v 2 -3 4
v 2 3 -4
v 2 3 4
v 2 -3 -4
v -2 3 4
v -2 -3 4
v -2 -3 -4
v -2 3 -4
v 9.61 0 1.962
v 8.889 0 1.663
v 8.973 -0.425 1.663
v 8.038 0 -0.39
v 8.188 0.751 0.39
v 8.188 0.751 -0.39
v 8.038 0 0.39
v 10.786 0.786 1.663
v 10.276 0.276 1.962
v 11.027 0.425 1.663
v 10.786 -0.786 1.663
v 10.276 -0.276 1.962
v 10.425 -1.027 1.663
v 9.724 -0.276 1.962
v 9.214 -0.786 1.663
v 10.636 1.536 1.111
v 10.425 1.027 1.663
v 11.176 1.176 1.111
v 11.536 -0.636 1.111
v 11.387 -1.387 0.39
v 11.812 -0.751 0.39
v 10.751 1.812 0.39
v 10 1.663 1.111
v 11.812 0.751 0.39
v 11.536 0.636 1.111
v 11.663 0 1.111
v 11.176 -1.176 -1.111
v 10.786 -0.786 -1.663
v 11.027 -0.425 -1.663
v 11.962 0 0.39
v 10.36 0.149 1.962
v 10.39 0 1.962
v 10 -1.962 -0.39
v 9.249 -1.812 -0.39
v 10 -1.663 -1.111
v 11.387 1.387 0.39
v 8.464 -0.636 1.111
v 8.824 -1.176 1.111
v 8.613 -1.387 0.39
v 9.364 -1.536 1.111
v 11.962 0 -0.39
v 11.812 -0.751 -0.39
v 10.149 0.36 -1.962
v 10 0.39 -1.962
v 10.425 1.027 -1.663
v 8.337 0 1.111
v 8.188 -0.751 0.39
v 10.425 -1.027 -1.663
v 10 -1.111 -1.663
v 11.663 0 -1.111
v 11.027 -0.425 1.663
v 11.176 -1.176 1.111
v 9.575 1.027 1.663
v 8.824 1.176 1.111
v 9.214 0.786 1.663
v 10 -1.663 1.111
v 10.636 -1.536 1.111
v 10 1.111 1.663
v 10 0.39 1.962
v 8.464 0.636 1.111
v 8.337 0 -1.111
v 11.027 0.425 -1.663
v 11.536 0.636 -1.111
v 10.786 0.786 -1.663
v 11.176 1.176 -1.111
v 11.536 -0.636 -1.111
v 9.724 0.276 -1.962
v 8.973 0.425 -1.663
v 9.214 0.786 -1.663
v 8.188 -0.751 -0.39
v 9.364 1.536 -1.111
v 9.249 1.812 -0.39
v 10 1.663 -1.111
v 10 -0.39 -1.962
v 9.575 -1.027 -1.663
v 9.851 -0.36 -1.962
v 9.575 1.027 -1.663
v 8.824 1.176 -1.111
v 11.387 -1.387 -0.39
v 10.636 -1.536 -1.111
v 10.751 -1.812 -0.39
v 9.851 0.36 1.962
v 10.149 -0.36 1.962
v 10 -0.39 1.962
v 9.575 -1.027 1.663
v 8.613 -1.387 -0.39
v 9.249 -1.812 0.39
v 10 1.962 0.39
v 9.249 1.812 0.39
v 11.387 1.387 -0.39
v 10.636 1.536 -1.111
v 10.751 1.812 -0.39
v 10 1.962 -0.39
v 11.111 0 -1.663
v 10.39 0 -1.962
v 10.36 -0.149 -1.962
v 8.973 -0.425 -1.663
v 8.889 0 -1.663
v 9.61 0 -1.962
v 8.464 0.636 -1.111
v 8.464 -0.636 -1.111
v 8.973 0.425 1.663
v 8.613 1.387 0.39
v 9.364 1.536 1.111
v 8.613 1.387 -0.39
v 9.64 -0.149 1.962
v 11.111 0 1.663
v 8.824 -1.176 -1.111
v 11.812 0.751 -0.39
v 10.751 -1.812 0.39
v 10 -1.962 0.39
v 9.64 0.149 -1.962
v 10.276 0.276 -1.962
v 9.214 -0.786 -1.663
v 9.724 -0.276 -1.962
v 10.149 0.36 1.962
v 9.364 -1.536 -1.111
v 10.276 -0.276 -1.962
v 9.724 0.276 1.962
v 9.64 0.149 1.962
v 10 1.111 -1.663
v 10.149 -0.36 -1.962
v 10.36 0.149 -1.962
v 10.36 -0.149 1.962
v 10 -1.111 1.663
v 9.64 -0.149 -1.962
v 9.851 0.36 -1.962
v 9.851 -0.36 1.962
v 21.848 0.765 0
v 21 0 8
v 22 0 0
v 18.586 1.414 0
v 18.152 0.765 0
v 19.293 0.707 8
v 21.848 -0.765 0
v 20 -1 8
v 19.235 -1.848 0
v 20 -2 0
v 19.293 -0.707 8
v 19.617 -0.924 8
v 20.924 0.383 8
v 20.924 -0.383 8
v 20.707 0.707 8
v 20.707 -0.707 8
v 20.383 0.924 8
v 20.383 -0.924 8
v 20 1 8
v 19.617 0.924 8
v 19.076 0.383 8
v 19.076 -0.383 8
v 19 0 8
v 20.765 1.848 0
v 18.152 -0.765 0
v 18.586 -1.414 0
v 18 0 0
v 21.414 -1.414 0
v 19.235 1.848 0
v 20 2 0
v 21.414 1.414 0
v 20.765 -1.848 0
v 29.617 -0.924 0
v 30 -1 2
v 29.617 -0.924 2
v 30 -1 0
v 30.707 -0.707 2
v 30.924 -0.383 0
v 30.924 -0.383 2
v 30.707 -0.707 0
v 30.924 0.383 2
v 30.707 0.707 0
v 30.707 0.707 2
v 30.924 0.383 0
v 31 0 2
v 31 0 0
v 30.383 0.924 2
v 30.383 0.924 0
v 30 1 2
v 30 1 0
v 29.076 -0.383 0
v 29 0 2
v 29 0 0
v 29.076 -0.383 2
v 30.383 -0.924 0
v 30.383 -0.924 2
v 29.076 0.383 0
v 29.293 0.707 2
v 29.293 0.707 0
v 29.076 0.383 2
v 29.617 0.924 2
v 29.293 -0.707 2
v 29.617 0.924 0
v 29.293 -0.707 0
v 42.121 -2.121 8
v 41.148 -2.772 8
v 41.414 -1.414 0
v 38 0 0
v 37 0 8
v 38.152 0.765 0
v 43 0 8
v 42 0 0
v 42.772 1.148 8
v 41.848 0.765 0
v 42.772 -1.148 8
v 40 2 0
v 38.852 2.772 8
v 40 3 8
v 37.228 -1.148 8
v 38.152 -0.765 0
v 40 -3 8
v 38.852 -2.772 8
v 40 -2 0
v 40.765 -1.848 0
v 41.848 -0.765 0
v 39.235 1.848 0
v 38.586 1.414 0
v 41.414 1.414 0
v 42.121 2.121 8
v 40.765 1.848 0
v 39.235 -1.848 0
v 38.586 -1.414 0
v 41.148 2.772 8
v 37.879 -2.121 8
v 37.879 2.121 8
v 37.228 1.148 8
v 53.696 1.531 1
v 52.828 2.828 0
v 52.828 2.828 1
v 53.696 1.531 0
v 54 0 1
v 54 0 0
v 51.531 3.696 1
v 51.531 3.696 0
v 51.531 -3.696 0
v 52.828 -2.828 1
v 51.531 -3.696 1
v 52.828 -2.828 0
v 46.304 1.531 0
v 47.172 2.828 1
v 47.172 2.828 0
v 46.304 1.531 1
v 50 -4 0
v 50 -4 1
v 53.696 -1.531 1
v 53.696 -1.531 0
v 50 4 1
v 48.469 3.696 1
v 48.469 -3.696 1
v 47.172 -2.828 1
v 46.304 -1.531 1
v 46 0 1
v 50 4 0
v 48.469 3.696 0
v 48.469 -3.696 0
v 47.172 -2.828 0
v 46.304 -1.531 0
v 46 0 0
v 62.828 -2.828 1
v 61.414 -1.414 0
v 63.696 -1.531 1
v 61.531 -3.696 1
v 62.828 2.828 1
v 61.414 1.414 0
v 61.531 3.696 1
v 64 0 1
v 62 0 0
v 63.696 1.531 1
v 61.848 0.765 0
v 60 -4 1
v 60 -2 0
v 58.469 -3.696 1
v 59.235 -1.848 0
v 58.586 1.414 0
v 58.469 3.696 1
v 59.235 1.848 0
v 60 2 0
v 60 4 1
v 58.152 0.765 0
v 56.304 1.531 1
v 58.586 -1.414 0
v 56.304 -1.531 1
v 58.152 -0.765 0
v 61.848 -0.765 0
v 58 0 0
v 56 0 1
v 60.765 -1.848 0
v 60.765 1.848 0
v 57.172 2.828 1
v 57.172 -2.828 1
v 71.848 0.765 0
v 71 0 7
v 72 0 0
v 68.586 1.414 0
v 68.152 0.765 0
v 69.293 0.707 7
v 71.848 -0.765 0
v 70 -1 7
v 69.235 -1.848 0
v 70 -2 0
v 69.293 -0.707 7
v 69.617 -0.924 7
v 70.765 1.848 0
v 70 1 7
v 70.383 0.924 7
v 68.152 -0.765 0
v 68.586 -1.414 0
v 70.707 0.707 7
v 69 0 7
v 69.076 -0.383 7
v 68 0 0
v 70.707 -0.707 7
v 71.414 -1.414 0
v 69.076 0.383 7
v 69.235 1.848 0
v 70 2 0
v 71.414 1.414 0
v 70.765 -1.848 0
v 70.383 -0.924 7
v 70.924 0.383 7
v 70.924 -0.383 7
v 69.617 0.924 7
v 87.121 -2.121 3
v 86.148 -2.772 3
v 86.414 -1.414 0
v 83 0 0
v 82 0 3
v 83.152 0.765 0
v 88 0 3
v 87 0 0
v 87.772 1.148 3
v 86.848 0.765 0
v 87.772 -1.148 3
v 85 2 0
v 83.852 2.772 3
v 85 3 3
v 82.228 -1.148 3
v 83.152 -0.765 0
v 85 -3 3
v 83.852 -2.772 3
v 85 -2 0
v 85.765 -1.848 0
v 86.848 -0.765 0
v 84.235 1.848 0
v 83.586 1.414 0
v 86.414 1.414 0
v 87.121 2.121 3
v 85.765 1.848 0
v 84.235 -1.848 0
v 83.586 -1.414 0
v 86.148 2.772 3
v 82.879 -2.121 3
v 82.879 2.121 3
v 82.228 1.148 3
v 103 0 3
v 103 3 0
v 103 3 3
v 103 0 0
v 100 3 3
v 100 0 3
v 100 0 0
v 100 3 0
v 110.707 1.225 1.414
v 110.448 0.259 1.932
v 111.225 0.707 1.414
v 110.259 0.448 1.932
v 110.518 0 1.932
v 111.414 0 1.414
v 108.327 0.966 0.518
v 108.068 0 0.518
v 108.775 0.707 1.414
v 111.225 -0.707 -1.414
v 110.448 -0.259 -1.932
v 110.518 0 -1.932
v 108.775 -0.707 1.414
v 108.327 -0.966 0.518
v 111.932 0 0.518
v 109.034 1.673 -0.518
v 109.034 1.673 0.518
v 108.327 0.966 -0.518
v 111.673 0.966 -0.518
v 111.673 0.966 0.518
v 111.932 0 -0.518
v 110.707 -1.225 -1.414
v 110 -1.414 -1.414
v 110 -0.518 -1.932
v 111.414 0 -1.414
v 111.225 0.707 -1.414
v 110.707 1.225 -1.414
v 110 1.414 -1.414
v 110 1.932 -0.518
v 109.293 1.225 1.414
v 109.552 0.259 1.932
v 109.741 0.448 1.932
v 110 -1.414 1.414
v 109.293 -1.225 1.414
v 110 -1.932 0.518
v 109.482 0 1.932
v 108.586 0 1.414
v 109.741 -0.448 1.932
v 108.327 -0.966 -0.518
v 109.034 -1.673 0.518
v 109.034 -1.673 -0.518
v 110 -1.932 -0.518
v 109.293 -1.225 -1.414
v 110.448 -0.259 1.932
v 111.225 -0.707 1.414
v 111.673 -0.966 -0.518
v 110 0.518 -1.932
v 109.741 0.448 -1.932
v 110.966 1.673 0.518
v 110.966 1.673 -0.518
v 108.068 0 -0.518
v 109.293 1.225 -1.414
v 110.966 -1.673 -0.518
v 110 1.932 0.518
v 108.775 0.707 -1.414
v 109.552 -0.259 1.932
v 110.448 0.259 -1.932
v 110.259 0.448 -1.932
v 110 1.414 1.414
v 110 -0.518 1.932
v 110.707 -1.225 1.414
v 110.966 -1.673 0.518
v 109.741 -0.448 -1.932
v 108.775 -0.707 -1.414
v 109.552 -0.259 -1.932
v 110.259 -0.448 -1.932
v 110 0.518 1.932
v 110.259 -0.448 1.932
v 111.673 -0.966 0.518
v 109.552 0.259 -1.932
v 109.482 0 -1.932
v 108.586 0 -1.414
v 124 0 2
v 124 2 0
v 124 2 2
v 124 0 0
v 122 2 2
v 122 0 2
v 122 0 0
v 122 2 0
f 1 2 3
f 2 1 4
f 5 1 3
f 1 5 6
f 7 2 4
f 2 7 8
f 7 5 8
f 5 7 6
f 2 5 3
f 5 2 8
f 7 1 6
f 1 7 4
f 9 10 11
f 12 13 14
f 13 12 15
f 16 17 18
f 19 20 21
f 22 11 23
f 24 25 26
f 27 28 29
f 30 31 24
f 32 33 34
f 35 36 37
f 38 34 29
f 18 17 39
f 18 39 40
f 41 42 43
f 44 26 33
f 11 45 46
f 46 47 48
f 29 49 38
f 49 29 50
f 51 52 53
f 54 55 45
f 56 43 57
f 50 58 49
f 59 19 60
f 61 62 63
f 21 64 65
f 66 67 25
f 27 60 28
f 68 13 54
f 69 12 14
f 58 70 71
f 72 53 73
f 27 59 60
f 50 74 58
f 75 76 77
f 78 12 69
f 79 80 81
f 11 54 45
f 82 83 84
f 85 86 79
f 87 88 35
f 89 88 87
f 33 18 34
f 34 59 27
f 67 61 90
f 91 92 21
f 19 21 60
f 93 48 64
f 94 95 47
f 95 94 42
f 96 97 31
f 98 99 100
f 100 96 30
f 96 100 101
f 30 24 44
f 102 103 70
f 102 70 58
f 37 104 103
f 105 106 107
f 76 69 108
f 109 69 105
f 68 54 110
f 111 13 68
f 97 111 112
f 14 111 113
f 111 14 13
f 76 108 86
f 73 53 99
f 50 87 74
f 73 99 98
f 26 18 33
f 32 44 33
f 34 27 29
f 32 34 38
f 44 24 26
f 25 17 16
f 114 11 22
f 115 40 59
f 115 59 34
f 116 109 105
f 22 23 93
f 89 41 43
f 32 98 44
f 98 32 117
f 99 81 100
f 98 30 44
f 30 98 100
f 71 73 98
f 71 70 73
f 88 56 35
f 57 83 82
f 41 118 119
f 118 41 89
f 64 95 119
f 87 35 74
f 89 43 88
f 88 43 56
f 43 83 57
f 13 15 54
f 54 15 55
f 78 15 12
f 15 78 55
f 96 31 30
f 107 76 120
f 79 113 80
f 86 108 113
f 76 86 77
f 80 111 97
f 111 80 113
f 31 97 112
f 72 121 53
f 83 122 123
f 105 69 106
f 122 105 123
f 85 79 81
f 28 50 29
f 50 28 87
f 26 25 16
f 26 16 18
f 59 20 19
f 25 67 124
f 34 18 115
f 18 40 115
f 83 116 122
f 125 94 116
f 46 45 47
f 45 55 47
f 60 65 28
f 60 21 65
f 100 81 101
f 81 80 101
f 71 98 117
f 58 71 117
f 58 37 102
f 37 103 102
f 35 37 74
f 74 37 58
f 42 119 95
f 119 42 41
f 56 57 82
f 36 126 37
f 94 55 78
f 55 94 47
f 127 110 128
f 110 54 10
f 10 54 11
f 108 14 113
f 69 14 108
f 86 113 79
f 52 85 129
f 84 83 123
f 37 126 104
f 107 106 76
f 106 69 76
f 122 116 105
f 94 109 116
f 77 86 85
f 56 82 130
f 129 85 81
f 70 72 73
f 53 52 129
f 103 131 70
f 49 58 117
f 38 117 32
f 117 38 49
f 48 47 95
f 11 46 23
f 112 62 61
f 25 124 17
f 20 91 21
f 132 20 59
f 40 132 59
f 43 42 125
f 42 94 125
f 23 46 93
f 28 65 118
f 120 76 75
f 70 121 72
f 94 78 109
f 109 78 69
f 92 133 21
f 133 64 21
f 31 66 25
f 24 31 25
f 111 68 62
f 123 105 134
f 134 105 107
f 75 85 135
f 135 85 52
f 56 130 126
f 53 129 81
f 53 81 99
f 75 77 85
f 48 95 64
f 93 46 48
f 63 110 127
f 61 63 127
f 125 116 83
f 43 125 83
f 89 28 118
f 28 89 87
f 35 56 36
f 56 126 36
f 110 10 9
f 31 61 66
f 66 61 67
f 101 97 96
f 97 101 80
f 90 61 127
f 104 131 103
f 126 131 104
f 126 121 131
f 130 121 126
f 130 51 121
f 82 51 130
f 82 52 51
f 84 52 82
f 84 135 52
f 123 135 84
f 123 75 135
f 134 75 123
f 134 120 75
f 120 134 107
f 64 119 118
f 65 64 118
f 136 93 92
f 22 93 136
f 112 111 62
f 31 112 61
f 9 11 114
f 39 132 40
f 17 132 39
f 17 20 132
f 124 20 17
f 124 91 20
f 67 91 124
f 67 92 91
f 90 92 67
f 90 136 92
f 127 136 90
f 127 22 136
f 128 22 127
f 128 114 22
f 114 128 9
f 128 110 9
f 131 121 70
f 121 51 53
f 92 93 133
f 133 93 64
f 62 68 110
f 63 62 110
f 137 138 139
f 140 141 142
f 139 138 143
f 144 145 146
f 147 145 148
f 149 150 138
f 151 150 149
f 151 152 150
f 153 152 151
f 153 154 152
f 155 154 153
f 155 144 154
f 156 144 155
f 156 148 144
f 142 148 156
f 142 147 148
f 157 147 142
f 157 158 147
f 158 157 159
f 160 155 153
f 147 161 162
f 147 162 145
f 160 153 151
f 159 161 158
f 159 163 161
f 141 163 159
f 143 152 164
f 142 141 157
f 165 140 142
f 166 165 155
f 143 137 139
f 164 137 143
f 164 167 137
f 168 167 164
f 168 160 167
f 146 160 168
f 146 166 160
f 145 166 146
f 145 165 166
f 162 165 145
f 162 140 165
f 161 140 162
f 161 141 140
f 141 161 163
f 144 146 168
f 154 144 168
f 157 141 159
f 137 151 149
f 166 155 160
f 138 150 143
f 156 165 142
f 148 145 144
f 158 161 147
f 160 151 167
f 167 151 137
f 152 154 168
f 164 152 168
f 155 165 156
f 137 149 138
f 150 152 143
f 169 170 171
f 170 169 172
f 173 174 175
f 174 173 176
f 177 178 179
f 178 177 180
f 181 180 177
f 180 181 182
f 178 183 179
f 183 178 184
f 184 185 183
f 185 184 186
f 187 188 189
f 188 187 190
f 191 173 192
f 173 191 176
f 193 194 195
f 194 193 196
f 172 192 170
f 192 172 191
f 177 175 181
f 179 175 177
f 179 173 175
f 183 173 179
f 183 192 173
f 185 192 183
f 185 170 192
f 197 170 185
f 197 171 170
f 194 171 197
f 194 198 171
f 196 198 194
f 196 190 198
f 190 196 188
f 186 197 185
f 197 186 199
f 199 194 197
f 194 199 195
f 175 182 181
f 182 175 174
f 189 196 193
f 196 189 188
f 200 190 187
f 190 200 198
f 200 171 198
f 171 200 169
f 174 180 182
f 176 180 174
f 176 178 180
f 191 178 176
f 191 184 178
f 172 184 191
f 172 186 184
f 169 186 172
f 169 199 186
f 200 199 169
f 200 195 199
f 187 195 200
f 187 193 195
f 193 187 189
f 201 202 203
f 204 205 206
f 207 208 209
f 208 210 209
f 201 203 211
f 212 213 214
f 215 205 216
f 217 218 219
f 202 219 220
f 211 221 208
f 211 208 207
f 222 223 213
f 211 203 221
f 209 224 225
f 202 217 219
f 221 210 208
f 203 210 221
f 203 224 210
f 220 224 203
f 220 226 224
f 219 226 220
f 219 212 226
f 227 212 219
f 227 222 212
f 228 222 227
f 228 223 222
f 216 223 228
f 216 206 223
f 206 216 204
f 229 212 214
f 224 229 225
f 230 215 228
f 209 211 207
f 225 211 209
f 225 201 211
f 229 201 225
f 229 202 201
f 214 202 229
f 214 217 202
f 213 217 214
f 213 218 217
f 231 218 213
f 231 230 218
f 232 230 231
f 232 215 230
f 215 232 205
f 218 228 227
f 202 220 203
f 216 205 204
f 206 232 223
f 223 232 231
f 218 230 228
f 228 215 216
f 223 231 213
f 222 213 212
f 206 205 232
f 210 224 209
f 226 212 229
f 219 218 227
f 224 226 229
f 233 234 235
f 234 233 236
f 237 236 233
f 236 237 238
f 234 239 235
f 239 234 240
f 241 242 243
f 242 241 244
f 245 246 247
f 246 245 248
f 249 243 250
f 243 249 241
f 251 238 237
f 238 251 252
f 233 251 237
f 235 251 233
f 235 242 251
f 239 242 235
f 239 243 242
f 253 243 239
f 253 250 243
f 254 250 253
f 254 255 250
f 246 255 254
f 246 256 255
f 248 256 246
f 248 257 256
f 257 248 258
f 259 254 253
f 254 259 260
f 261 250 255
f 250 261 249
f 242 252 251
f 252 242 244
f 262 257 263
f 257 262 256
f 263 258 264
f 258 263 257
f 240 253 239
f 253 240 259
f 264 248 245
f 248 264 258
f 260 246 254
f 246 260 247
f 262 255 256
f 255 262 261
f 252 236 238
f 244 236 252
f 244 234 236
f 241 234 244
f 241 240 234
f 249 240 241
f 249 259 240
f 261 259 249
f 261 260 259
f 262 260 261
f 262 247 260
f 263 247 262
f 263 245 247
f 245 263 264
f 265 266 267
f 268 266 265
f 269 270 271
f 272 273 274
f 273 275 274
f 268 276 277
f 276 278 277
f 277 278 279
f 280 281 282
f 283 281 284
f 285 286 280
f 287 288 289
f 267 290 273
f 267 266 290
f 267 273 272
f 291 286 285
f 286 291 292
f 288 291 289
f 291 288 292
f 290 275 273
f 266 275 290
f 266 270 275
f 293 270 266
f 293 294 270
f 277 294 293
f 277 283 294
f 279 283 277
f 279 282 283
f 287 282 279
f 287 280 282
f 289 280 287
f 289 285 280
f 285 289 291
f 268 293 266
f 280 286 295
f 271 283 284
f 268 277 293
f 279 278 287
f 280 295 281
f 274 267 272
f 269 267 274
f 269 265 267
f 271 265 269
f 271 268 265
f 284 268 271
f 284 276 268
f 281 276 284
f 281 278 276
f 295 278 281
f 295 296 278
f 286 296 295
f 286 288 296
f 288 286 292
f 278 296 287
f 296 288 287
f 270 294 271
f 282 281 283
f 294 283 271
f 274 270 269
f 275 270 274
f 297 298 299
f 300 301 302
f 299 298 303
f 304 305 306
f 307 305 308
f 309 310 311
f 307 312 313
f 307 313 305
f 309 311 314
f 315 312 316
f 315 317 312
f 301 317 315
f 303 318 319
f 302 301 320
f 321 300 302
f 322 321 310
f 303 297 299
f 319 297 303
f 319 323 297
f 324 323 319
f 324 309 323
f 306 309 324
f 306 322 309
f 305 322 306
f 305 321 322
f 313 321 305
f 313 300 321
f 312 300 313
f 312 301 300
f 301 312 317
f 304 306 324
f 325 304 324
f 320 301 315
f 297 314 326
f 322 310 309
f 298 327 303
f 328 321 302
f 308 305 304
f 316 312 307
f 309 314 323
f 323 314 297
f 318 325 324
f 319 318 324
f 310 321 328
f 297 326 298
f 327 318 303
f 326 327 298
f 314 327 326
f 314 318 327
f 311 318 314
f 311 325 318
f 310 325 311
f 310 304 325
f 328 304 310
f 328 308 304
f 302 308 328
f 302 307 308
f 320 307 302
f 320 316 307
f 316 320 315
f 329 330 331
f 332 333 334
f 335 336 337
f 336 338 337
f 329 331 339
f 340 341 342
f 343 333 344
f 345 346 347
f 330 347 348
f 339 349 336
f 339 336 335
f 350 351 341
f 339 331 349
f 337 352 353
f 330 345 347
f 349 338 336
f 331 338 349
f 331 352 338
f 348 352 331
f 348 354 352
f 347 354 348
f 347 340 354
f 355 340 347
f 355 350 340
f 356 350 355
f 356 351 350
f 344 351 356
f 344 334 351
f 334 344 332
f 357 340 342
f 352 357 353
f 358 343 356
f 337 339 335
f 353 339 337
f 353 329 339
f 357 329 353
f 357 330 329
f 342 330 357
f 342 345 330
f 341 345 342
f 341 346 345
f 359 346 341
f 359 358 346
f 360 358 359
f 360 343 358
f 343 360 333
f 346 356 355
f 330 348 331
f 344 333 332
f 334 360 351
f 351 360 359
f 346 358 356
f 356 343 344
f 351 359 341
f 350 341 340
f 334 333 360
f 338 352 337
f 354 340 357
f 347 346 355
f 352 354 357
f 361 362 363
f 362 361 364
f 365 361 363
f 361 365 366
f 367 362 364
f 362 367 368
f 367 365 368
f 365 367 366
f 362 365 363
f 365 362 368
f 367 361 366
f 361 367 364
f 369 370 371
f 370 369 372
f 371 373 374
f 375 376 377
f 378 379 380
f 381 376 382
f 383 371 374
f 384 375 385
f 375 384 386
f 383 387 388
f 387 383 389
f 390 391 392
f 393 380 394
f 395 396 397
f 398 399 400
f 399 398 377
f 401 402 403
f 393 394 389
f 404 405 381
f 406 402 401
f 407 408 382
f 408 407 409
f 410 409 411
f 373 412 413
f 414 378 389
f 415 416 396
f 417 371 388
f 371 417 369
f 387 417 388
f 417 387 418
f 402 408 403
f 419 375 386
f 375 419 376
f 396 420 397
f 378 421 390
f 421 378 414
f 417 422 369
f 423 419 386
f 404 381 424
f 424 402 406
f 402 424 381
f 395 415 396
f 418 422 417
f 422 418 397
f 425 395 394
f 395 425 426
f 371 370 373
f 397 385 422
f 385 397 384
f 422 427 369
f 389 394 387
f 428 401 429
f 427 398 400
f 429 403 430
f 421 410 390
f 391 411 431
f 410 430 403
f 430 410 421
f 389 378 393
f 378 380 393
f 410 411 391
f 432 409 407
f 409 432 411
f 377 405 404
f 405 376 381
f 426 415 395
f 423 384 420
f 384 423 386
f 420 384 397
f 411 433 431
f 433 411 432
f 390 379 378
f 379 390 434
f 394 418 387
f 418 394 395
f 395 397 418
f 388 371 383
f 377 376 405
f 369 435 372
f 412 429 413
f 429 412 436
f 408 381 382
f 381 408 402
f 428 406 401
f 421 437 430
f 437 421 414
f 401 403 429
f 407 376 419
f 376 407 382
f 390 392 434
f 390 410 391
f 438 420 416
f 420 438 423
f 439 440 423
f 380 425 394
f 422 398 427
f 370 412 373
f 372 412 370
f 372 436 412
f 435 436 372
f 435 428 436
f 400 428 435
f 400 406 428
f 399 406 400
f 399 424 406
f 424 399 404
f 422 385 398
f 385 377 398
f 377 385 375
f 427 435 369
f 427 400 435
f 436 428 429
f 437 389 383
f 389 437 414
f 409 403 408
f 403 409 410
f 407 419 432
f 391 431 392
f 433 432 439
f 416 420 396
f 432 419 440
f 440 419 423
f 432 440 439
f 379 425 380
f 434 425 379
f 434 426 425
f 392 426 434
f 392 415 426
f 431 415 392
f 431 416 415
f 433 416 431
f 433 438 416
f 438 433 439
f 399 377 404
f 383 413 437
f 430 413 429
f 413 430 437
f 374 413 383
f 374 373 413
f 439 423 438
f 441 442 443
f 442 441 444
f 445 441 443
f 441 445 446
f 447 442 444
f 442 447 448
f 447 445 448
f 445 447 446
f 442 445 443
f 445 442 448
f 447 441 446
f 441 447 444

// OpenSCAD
// The positions separate the solids so the reference can compare the full fixture.
$fn = 16;
cube([4, 6, 8], center = true);
translate([10, 0]) sphere(r = 2);
translate([20, 0, 0]) cylinder(8, 2);
translate([30, 0, 0]) cylinder(h = 8, 2);
translate([40, 0, 0]) cylinder(8, 2, 3, false, 5);
translate([50, 0, 0]) cylinder(d = 8, r = 1);
translate([60, 0, 0]) cylinder(r = 2, r2 = 4);
translate([70, 0, 0]) cylinder(8, 2, h = 7);
translate([85, 0, 0]) cylinder(3, 2, 3, false, 4, 6, 8, 10, 1);
translate([100, 0, 0]) translate(5) cube(3);
translate([110, 0, 0]) sphere(d = 4, $fn = 12);
translate([125, 0, 0]) translate([-3, 0, 0]) cube(2);
